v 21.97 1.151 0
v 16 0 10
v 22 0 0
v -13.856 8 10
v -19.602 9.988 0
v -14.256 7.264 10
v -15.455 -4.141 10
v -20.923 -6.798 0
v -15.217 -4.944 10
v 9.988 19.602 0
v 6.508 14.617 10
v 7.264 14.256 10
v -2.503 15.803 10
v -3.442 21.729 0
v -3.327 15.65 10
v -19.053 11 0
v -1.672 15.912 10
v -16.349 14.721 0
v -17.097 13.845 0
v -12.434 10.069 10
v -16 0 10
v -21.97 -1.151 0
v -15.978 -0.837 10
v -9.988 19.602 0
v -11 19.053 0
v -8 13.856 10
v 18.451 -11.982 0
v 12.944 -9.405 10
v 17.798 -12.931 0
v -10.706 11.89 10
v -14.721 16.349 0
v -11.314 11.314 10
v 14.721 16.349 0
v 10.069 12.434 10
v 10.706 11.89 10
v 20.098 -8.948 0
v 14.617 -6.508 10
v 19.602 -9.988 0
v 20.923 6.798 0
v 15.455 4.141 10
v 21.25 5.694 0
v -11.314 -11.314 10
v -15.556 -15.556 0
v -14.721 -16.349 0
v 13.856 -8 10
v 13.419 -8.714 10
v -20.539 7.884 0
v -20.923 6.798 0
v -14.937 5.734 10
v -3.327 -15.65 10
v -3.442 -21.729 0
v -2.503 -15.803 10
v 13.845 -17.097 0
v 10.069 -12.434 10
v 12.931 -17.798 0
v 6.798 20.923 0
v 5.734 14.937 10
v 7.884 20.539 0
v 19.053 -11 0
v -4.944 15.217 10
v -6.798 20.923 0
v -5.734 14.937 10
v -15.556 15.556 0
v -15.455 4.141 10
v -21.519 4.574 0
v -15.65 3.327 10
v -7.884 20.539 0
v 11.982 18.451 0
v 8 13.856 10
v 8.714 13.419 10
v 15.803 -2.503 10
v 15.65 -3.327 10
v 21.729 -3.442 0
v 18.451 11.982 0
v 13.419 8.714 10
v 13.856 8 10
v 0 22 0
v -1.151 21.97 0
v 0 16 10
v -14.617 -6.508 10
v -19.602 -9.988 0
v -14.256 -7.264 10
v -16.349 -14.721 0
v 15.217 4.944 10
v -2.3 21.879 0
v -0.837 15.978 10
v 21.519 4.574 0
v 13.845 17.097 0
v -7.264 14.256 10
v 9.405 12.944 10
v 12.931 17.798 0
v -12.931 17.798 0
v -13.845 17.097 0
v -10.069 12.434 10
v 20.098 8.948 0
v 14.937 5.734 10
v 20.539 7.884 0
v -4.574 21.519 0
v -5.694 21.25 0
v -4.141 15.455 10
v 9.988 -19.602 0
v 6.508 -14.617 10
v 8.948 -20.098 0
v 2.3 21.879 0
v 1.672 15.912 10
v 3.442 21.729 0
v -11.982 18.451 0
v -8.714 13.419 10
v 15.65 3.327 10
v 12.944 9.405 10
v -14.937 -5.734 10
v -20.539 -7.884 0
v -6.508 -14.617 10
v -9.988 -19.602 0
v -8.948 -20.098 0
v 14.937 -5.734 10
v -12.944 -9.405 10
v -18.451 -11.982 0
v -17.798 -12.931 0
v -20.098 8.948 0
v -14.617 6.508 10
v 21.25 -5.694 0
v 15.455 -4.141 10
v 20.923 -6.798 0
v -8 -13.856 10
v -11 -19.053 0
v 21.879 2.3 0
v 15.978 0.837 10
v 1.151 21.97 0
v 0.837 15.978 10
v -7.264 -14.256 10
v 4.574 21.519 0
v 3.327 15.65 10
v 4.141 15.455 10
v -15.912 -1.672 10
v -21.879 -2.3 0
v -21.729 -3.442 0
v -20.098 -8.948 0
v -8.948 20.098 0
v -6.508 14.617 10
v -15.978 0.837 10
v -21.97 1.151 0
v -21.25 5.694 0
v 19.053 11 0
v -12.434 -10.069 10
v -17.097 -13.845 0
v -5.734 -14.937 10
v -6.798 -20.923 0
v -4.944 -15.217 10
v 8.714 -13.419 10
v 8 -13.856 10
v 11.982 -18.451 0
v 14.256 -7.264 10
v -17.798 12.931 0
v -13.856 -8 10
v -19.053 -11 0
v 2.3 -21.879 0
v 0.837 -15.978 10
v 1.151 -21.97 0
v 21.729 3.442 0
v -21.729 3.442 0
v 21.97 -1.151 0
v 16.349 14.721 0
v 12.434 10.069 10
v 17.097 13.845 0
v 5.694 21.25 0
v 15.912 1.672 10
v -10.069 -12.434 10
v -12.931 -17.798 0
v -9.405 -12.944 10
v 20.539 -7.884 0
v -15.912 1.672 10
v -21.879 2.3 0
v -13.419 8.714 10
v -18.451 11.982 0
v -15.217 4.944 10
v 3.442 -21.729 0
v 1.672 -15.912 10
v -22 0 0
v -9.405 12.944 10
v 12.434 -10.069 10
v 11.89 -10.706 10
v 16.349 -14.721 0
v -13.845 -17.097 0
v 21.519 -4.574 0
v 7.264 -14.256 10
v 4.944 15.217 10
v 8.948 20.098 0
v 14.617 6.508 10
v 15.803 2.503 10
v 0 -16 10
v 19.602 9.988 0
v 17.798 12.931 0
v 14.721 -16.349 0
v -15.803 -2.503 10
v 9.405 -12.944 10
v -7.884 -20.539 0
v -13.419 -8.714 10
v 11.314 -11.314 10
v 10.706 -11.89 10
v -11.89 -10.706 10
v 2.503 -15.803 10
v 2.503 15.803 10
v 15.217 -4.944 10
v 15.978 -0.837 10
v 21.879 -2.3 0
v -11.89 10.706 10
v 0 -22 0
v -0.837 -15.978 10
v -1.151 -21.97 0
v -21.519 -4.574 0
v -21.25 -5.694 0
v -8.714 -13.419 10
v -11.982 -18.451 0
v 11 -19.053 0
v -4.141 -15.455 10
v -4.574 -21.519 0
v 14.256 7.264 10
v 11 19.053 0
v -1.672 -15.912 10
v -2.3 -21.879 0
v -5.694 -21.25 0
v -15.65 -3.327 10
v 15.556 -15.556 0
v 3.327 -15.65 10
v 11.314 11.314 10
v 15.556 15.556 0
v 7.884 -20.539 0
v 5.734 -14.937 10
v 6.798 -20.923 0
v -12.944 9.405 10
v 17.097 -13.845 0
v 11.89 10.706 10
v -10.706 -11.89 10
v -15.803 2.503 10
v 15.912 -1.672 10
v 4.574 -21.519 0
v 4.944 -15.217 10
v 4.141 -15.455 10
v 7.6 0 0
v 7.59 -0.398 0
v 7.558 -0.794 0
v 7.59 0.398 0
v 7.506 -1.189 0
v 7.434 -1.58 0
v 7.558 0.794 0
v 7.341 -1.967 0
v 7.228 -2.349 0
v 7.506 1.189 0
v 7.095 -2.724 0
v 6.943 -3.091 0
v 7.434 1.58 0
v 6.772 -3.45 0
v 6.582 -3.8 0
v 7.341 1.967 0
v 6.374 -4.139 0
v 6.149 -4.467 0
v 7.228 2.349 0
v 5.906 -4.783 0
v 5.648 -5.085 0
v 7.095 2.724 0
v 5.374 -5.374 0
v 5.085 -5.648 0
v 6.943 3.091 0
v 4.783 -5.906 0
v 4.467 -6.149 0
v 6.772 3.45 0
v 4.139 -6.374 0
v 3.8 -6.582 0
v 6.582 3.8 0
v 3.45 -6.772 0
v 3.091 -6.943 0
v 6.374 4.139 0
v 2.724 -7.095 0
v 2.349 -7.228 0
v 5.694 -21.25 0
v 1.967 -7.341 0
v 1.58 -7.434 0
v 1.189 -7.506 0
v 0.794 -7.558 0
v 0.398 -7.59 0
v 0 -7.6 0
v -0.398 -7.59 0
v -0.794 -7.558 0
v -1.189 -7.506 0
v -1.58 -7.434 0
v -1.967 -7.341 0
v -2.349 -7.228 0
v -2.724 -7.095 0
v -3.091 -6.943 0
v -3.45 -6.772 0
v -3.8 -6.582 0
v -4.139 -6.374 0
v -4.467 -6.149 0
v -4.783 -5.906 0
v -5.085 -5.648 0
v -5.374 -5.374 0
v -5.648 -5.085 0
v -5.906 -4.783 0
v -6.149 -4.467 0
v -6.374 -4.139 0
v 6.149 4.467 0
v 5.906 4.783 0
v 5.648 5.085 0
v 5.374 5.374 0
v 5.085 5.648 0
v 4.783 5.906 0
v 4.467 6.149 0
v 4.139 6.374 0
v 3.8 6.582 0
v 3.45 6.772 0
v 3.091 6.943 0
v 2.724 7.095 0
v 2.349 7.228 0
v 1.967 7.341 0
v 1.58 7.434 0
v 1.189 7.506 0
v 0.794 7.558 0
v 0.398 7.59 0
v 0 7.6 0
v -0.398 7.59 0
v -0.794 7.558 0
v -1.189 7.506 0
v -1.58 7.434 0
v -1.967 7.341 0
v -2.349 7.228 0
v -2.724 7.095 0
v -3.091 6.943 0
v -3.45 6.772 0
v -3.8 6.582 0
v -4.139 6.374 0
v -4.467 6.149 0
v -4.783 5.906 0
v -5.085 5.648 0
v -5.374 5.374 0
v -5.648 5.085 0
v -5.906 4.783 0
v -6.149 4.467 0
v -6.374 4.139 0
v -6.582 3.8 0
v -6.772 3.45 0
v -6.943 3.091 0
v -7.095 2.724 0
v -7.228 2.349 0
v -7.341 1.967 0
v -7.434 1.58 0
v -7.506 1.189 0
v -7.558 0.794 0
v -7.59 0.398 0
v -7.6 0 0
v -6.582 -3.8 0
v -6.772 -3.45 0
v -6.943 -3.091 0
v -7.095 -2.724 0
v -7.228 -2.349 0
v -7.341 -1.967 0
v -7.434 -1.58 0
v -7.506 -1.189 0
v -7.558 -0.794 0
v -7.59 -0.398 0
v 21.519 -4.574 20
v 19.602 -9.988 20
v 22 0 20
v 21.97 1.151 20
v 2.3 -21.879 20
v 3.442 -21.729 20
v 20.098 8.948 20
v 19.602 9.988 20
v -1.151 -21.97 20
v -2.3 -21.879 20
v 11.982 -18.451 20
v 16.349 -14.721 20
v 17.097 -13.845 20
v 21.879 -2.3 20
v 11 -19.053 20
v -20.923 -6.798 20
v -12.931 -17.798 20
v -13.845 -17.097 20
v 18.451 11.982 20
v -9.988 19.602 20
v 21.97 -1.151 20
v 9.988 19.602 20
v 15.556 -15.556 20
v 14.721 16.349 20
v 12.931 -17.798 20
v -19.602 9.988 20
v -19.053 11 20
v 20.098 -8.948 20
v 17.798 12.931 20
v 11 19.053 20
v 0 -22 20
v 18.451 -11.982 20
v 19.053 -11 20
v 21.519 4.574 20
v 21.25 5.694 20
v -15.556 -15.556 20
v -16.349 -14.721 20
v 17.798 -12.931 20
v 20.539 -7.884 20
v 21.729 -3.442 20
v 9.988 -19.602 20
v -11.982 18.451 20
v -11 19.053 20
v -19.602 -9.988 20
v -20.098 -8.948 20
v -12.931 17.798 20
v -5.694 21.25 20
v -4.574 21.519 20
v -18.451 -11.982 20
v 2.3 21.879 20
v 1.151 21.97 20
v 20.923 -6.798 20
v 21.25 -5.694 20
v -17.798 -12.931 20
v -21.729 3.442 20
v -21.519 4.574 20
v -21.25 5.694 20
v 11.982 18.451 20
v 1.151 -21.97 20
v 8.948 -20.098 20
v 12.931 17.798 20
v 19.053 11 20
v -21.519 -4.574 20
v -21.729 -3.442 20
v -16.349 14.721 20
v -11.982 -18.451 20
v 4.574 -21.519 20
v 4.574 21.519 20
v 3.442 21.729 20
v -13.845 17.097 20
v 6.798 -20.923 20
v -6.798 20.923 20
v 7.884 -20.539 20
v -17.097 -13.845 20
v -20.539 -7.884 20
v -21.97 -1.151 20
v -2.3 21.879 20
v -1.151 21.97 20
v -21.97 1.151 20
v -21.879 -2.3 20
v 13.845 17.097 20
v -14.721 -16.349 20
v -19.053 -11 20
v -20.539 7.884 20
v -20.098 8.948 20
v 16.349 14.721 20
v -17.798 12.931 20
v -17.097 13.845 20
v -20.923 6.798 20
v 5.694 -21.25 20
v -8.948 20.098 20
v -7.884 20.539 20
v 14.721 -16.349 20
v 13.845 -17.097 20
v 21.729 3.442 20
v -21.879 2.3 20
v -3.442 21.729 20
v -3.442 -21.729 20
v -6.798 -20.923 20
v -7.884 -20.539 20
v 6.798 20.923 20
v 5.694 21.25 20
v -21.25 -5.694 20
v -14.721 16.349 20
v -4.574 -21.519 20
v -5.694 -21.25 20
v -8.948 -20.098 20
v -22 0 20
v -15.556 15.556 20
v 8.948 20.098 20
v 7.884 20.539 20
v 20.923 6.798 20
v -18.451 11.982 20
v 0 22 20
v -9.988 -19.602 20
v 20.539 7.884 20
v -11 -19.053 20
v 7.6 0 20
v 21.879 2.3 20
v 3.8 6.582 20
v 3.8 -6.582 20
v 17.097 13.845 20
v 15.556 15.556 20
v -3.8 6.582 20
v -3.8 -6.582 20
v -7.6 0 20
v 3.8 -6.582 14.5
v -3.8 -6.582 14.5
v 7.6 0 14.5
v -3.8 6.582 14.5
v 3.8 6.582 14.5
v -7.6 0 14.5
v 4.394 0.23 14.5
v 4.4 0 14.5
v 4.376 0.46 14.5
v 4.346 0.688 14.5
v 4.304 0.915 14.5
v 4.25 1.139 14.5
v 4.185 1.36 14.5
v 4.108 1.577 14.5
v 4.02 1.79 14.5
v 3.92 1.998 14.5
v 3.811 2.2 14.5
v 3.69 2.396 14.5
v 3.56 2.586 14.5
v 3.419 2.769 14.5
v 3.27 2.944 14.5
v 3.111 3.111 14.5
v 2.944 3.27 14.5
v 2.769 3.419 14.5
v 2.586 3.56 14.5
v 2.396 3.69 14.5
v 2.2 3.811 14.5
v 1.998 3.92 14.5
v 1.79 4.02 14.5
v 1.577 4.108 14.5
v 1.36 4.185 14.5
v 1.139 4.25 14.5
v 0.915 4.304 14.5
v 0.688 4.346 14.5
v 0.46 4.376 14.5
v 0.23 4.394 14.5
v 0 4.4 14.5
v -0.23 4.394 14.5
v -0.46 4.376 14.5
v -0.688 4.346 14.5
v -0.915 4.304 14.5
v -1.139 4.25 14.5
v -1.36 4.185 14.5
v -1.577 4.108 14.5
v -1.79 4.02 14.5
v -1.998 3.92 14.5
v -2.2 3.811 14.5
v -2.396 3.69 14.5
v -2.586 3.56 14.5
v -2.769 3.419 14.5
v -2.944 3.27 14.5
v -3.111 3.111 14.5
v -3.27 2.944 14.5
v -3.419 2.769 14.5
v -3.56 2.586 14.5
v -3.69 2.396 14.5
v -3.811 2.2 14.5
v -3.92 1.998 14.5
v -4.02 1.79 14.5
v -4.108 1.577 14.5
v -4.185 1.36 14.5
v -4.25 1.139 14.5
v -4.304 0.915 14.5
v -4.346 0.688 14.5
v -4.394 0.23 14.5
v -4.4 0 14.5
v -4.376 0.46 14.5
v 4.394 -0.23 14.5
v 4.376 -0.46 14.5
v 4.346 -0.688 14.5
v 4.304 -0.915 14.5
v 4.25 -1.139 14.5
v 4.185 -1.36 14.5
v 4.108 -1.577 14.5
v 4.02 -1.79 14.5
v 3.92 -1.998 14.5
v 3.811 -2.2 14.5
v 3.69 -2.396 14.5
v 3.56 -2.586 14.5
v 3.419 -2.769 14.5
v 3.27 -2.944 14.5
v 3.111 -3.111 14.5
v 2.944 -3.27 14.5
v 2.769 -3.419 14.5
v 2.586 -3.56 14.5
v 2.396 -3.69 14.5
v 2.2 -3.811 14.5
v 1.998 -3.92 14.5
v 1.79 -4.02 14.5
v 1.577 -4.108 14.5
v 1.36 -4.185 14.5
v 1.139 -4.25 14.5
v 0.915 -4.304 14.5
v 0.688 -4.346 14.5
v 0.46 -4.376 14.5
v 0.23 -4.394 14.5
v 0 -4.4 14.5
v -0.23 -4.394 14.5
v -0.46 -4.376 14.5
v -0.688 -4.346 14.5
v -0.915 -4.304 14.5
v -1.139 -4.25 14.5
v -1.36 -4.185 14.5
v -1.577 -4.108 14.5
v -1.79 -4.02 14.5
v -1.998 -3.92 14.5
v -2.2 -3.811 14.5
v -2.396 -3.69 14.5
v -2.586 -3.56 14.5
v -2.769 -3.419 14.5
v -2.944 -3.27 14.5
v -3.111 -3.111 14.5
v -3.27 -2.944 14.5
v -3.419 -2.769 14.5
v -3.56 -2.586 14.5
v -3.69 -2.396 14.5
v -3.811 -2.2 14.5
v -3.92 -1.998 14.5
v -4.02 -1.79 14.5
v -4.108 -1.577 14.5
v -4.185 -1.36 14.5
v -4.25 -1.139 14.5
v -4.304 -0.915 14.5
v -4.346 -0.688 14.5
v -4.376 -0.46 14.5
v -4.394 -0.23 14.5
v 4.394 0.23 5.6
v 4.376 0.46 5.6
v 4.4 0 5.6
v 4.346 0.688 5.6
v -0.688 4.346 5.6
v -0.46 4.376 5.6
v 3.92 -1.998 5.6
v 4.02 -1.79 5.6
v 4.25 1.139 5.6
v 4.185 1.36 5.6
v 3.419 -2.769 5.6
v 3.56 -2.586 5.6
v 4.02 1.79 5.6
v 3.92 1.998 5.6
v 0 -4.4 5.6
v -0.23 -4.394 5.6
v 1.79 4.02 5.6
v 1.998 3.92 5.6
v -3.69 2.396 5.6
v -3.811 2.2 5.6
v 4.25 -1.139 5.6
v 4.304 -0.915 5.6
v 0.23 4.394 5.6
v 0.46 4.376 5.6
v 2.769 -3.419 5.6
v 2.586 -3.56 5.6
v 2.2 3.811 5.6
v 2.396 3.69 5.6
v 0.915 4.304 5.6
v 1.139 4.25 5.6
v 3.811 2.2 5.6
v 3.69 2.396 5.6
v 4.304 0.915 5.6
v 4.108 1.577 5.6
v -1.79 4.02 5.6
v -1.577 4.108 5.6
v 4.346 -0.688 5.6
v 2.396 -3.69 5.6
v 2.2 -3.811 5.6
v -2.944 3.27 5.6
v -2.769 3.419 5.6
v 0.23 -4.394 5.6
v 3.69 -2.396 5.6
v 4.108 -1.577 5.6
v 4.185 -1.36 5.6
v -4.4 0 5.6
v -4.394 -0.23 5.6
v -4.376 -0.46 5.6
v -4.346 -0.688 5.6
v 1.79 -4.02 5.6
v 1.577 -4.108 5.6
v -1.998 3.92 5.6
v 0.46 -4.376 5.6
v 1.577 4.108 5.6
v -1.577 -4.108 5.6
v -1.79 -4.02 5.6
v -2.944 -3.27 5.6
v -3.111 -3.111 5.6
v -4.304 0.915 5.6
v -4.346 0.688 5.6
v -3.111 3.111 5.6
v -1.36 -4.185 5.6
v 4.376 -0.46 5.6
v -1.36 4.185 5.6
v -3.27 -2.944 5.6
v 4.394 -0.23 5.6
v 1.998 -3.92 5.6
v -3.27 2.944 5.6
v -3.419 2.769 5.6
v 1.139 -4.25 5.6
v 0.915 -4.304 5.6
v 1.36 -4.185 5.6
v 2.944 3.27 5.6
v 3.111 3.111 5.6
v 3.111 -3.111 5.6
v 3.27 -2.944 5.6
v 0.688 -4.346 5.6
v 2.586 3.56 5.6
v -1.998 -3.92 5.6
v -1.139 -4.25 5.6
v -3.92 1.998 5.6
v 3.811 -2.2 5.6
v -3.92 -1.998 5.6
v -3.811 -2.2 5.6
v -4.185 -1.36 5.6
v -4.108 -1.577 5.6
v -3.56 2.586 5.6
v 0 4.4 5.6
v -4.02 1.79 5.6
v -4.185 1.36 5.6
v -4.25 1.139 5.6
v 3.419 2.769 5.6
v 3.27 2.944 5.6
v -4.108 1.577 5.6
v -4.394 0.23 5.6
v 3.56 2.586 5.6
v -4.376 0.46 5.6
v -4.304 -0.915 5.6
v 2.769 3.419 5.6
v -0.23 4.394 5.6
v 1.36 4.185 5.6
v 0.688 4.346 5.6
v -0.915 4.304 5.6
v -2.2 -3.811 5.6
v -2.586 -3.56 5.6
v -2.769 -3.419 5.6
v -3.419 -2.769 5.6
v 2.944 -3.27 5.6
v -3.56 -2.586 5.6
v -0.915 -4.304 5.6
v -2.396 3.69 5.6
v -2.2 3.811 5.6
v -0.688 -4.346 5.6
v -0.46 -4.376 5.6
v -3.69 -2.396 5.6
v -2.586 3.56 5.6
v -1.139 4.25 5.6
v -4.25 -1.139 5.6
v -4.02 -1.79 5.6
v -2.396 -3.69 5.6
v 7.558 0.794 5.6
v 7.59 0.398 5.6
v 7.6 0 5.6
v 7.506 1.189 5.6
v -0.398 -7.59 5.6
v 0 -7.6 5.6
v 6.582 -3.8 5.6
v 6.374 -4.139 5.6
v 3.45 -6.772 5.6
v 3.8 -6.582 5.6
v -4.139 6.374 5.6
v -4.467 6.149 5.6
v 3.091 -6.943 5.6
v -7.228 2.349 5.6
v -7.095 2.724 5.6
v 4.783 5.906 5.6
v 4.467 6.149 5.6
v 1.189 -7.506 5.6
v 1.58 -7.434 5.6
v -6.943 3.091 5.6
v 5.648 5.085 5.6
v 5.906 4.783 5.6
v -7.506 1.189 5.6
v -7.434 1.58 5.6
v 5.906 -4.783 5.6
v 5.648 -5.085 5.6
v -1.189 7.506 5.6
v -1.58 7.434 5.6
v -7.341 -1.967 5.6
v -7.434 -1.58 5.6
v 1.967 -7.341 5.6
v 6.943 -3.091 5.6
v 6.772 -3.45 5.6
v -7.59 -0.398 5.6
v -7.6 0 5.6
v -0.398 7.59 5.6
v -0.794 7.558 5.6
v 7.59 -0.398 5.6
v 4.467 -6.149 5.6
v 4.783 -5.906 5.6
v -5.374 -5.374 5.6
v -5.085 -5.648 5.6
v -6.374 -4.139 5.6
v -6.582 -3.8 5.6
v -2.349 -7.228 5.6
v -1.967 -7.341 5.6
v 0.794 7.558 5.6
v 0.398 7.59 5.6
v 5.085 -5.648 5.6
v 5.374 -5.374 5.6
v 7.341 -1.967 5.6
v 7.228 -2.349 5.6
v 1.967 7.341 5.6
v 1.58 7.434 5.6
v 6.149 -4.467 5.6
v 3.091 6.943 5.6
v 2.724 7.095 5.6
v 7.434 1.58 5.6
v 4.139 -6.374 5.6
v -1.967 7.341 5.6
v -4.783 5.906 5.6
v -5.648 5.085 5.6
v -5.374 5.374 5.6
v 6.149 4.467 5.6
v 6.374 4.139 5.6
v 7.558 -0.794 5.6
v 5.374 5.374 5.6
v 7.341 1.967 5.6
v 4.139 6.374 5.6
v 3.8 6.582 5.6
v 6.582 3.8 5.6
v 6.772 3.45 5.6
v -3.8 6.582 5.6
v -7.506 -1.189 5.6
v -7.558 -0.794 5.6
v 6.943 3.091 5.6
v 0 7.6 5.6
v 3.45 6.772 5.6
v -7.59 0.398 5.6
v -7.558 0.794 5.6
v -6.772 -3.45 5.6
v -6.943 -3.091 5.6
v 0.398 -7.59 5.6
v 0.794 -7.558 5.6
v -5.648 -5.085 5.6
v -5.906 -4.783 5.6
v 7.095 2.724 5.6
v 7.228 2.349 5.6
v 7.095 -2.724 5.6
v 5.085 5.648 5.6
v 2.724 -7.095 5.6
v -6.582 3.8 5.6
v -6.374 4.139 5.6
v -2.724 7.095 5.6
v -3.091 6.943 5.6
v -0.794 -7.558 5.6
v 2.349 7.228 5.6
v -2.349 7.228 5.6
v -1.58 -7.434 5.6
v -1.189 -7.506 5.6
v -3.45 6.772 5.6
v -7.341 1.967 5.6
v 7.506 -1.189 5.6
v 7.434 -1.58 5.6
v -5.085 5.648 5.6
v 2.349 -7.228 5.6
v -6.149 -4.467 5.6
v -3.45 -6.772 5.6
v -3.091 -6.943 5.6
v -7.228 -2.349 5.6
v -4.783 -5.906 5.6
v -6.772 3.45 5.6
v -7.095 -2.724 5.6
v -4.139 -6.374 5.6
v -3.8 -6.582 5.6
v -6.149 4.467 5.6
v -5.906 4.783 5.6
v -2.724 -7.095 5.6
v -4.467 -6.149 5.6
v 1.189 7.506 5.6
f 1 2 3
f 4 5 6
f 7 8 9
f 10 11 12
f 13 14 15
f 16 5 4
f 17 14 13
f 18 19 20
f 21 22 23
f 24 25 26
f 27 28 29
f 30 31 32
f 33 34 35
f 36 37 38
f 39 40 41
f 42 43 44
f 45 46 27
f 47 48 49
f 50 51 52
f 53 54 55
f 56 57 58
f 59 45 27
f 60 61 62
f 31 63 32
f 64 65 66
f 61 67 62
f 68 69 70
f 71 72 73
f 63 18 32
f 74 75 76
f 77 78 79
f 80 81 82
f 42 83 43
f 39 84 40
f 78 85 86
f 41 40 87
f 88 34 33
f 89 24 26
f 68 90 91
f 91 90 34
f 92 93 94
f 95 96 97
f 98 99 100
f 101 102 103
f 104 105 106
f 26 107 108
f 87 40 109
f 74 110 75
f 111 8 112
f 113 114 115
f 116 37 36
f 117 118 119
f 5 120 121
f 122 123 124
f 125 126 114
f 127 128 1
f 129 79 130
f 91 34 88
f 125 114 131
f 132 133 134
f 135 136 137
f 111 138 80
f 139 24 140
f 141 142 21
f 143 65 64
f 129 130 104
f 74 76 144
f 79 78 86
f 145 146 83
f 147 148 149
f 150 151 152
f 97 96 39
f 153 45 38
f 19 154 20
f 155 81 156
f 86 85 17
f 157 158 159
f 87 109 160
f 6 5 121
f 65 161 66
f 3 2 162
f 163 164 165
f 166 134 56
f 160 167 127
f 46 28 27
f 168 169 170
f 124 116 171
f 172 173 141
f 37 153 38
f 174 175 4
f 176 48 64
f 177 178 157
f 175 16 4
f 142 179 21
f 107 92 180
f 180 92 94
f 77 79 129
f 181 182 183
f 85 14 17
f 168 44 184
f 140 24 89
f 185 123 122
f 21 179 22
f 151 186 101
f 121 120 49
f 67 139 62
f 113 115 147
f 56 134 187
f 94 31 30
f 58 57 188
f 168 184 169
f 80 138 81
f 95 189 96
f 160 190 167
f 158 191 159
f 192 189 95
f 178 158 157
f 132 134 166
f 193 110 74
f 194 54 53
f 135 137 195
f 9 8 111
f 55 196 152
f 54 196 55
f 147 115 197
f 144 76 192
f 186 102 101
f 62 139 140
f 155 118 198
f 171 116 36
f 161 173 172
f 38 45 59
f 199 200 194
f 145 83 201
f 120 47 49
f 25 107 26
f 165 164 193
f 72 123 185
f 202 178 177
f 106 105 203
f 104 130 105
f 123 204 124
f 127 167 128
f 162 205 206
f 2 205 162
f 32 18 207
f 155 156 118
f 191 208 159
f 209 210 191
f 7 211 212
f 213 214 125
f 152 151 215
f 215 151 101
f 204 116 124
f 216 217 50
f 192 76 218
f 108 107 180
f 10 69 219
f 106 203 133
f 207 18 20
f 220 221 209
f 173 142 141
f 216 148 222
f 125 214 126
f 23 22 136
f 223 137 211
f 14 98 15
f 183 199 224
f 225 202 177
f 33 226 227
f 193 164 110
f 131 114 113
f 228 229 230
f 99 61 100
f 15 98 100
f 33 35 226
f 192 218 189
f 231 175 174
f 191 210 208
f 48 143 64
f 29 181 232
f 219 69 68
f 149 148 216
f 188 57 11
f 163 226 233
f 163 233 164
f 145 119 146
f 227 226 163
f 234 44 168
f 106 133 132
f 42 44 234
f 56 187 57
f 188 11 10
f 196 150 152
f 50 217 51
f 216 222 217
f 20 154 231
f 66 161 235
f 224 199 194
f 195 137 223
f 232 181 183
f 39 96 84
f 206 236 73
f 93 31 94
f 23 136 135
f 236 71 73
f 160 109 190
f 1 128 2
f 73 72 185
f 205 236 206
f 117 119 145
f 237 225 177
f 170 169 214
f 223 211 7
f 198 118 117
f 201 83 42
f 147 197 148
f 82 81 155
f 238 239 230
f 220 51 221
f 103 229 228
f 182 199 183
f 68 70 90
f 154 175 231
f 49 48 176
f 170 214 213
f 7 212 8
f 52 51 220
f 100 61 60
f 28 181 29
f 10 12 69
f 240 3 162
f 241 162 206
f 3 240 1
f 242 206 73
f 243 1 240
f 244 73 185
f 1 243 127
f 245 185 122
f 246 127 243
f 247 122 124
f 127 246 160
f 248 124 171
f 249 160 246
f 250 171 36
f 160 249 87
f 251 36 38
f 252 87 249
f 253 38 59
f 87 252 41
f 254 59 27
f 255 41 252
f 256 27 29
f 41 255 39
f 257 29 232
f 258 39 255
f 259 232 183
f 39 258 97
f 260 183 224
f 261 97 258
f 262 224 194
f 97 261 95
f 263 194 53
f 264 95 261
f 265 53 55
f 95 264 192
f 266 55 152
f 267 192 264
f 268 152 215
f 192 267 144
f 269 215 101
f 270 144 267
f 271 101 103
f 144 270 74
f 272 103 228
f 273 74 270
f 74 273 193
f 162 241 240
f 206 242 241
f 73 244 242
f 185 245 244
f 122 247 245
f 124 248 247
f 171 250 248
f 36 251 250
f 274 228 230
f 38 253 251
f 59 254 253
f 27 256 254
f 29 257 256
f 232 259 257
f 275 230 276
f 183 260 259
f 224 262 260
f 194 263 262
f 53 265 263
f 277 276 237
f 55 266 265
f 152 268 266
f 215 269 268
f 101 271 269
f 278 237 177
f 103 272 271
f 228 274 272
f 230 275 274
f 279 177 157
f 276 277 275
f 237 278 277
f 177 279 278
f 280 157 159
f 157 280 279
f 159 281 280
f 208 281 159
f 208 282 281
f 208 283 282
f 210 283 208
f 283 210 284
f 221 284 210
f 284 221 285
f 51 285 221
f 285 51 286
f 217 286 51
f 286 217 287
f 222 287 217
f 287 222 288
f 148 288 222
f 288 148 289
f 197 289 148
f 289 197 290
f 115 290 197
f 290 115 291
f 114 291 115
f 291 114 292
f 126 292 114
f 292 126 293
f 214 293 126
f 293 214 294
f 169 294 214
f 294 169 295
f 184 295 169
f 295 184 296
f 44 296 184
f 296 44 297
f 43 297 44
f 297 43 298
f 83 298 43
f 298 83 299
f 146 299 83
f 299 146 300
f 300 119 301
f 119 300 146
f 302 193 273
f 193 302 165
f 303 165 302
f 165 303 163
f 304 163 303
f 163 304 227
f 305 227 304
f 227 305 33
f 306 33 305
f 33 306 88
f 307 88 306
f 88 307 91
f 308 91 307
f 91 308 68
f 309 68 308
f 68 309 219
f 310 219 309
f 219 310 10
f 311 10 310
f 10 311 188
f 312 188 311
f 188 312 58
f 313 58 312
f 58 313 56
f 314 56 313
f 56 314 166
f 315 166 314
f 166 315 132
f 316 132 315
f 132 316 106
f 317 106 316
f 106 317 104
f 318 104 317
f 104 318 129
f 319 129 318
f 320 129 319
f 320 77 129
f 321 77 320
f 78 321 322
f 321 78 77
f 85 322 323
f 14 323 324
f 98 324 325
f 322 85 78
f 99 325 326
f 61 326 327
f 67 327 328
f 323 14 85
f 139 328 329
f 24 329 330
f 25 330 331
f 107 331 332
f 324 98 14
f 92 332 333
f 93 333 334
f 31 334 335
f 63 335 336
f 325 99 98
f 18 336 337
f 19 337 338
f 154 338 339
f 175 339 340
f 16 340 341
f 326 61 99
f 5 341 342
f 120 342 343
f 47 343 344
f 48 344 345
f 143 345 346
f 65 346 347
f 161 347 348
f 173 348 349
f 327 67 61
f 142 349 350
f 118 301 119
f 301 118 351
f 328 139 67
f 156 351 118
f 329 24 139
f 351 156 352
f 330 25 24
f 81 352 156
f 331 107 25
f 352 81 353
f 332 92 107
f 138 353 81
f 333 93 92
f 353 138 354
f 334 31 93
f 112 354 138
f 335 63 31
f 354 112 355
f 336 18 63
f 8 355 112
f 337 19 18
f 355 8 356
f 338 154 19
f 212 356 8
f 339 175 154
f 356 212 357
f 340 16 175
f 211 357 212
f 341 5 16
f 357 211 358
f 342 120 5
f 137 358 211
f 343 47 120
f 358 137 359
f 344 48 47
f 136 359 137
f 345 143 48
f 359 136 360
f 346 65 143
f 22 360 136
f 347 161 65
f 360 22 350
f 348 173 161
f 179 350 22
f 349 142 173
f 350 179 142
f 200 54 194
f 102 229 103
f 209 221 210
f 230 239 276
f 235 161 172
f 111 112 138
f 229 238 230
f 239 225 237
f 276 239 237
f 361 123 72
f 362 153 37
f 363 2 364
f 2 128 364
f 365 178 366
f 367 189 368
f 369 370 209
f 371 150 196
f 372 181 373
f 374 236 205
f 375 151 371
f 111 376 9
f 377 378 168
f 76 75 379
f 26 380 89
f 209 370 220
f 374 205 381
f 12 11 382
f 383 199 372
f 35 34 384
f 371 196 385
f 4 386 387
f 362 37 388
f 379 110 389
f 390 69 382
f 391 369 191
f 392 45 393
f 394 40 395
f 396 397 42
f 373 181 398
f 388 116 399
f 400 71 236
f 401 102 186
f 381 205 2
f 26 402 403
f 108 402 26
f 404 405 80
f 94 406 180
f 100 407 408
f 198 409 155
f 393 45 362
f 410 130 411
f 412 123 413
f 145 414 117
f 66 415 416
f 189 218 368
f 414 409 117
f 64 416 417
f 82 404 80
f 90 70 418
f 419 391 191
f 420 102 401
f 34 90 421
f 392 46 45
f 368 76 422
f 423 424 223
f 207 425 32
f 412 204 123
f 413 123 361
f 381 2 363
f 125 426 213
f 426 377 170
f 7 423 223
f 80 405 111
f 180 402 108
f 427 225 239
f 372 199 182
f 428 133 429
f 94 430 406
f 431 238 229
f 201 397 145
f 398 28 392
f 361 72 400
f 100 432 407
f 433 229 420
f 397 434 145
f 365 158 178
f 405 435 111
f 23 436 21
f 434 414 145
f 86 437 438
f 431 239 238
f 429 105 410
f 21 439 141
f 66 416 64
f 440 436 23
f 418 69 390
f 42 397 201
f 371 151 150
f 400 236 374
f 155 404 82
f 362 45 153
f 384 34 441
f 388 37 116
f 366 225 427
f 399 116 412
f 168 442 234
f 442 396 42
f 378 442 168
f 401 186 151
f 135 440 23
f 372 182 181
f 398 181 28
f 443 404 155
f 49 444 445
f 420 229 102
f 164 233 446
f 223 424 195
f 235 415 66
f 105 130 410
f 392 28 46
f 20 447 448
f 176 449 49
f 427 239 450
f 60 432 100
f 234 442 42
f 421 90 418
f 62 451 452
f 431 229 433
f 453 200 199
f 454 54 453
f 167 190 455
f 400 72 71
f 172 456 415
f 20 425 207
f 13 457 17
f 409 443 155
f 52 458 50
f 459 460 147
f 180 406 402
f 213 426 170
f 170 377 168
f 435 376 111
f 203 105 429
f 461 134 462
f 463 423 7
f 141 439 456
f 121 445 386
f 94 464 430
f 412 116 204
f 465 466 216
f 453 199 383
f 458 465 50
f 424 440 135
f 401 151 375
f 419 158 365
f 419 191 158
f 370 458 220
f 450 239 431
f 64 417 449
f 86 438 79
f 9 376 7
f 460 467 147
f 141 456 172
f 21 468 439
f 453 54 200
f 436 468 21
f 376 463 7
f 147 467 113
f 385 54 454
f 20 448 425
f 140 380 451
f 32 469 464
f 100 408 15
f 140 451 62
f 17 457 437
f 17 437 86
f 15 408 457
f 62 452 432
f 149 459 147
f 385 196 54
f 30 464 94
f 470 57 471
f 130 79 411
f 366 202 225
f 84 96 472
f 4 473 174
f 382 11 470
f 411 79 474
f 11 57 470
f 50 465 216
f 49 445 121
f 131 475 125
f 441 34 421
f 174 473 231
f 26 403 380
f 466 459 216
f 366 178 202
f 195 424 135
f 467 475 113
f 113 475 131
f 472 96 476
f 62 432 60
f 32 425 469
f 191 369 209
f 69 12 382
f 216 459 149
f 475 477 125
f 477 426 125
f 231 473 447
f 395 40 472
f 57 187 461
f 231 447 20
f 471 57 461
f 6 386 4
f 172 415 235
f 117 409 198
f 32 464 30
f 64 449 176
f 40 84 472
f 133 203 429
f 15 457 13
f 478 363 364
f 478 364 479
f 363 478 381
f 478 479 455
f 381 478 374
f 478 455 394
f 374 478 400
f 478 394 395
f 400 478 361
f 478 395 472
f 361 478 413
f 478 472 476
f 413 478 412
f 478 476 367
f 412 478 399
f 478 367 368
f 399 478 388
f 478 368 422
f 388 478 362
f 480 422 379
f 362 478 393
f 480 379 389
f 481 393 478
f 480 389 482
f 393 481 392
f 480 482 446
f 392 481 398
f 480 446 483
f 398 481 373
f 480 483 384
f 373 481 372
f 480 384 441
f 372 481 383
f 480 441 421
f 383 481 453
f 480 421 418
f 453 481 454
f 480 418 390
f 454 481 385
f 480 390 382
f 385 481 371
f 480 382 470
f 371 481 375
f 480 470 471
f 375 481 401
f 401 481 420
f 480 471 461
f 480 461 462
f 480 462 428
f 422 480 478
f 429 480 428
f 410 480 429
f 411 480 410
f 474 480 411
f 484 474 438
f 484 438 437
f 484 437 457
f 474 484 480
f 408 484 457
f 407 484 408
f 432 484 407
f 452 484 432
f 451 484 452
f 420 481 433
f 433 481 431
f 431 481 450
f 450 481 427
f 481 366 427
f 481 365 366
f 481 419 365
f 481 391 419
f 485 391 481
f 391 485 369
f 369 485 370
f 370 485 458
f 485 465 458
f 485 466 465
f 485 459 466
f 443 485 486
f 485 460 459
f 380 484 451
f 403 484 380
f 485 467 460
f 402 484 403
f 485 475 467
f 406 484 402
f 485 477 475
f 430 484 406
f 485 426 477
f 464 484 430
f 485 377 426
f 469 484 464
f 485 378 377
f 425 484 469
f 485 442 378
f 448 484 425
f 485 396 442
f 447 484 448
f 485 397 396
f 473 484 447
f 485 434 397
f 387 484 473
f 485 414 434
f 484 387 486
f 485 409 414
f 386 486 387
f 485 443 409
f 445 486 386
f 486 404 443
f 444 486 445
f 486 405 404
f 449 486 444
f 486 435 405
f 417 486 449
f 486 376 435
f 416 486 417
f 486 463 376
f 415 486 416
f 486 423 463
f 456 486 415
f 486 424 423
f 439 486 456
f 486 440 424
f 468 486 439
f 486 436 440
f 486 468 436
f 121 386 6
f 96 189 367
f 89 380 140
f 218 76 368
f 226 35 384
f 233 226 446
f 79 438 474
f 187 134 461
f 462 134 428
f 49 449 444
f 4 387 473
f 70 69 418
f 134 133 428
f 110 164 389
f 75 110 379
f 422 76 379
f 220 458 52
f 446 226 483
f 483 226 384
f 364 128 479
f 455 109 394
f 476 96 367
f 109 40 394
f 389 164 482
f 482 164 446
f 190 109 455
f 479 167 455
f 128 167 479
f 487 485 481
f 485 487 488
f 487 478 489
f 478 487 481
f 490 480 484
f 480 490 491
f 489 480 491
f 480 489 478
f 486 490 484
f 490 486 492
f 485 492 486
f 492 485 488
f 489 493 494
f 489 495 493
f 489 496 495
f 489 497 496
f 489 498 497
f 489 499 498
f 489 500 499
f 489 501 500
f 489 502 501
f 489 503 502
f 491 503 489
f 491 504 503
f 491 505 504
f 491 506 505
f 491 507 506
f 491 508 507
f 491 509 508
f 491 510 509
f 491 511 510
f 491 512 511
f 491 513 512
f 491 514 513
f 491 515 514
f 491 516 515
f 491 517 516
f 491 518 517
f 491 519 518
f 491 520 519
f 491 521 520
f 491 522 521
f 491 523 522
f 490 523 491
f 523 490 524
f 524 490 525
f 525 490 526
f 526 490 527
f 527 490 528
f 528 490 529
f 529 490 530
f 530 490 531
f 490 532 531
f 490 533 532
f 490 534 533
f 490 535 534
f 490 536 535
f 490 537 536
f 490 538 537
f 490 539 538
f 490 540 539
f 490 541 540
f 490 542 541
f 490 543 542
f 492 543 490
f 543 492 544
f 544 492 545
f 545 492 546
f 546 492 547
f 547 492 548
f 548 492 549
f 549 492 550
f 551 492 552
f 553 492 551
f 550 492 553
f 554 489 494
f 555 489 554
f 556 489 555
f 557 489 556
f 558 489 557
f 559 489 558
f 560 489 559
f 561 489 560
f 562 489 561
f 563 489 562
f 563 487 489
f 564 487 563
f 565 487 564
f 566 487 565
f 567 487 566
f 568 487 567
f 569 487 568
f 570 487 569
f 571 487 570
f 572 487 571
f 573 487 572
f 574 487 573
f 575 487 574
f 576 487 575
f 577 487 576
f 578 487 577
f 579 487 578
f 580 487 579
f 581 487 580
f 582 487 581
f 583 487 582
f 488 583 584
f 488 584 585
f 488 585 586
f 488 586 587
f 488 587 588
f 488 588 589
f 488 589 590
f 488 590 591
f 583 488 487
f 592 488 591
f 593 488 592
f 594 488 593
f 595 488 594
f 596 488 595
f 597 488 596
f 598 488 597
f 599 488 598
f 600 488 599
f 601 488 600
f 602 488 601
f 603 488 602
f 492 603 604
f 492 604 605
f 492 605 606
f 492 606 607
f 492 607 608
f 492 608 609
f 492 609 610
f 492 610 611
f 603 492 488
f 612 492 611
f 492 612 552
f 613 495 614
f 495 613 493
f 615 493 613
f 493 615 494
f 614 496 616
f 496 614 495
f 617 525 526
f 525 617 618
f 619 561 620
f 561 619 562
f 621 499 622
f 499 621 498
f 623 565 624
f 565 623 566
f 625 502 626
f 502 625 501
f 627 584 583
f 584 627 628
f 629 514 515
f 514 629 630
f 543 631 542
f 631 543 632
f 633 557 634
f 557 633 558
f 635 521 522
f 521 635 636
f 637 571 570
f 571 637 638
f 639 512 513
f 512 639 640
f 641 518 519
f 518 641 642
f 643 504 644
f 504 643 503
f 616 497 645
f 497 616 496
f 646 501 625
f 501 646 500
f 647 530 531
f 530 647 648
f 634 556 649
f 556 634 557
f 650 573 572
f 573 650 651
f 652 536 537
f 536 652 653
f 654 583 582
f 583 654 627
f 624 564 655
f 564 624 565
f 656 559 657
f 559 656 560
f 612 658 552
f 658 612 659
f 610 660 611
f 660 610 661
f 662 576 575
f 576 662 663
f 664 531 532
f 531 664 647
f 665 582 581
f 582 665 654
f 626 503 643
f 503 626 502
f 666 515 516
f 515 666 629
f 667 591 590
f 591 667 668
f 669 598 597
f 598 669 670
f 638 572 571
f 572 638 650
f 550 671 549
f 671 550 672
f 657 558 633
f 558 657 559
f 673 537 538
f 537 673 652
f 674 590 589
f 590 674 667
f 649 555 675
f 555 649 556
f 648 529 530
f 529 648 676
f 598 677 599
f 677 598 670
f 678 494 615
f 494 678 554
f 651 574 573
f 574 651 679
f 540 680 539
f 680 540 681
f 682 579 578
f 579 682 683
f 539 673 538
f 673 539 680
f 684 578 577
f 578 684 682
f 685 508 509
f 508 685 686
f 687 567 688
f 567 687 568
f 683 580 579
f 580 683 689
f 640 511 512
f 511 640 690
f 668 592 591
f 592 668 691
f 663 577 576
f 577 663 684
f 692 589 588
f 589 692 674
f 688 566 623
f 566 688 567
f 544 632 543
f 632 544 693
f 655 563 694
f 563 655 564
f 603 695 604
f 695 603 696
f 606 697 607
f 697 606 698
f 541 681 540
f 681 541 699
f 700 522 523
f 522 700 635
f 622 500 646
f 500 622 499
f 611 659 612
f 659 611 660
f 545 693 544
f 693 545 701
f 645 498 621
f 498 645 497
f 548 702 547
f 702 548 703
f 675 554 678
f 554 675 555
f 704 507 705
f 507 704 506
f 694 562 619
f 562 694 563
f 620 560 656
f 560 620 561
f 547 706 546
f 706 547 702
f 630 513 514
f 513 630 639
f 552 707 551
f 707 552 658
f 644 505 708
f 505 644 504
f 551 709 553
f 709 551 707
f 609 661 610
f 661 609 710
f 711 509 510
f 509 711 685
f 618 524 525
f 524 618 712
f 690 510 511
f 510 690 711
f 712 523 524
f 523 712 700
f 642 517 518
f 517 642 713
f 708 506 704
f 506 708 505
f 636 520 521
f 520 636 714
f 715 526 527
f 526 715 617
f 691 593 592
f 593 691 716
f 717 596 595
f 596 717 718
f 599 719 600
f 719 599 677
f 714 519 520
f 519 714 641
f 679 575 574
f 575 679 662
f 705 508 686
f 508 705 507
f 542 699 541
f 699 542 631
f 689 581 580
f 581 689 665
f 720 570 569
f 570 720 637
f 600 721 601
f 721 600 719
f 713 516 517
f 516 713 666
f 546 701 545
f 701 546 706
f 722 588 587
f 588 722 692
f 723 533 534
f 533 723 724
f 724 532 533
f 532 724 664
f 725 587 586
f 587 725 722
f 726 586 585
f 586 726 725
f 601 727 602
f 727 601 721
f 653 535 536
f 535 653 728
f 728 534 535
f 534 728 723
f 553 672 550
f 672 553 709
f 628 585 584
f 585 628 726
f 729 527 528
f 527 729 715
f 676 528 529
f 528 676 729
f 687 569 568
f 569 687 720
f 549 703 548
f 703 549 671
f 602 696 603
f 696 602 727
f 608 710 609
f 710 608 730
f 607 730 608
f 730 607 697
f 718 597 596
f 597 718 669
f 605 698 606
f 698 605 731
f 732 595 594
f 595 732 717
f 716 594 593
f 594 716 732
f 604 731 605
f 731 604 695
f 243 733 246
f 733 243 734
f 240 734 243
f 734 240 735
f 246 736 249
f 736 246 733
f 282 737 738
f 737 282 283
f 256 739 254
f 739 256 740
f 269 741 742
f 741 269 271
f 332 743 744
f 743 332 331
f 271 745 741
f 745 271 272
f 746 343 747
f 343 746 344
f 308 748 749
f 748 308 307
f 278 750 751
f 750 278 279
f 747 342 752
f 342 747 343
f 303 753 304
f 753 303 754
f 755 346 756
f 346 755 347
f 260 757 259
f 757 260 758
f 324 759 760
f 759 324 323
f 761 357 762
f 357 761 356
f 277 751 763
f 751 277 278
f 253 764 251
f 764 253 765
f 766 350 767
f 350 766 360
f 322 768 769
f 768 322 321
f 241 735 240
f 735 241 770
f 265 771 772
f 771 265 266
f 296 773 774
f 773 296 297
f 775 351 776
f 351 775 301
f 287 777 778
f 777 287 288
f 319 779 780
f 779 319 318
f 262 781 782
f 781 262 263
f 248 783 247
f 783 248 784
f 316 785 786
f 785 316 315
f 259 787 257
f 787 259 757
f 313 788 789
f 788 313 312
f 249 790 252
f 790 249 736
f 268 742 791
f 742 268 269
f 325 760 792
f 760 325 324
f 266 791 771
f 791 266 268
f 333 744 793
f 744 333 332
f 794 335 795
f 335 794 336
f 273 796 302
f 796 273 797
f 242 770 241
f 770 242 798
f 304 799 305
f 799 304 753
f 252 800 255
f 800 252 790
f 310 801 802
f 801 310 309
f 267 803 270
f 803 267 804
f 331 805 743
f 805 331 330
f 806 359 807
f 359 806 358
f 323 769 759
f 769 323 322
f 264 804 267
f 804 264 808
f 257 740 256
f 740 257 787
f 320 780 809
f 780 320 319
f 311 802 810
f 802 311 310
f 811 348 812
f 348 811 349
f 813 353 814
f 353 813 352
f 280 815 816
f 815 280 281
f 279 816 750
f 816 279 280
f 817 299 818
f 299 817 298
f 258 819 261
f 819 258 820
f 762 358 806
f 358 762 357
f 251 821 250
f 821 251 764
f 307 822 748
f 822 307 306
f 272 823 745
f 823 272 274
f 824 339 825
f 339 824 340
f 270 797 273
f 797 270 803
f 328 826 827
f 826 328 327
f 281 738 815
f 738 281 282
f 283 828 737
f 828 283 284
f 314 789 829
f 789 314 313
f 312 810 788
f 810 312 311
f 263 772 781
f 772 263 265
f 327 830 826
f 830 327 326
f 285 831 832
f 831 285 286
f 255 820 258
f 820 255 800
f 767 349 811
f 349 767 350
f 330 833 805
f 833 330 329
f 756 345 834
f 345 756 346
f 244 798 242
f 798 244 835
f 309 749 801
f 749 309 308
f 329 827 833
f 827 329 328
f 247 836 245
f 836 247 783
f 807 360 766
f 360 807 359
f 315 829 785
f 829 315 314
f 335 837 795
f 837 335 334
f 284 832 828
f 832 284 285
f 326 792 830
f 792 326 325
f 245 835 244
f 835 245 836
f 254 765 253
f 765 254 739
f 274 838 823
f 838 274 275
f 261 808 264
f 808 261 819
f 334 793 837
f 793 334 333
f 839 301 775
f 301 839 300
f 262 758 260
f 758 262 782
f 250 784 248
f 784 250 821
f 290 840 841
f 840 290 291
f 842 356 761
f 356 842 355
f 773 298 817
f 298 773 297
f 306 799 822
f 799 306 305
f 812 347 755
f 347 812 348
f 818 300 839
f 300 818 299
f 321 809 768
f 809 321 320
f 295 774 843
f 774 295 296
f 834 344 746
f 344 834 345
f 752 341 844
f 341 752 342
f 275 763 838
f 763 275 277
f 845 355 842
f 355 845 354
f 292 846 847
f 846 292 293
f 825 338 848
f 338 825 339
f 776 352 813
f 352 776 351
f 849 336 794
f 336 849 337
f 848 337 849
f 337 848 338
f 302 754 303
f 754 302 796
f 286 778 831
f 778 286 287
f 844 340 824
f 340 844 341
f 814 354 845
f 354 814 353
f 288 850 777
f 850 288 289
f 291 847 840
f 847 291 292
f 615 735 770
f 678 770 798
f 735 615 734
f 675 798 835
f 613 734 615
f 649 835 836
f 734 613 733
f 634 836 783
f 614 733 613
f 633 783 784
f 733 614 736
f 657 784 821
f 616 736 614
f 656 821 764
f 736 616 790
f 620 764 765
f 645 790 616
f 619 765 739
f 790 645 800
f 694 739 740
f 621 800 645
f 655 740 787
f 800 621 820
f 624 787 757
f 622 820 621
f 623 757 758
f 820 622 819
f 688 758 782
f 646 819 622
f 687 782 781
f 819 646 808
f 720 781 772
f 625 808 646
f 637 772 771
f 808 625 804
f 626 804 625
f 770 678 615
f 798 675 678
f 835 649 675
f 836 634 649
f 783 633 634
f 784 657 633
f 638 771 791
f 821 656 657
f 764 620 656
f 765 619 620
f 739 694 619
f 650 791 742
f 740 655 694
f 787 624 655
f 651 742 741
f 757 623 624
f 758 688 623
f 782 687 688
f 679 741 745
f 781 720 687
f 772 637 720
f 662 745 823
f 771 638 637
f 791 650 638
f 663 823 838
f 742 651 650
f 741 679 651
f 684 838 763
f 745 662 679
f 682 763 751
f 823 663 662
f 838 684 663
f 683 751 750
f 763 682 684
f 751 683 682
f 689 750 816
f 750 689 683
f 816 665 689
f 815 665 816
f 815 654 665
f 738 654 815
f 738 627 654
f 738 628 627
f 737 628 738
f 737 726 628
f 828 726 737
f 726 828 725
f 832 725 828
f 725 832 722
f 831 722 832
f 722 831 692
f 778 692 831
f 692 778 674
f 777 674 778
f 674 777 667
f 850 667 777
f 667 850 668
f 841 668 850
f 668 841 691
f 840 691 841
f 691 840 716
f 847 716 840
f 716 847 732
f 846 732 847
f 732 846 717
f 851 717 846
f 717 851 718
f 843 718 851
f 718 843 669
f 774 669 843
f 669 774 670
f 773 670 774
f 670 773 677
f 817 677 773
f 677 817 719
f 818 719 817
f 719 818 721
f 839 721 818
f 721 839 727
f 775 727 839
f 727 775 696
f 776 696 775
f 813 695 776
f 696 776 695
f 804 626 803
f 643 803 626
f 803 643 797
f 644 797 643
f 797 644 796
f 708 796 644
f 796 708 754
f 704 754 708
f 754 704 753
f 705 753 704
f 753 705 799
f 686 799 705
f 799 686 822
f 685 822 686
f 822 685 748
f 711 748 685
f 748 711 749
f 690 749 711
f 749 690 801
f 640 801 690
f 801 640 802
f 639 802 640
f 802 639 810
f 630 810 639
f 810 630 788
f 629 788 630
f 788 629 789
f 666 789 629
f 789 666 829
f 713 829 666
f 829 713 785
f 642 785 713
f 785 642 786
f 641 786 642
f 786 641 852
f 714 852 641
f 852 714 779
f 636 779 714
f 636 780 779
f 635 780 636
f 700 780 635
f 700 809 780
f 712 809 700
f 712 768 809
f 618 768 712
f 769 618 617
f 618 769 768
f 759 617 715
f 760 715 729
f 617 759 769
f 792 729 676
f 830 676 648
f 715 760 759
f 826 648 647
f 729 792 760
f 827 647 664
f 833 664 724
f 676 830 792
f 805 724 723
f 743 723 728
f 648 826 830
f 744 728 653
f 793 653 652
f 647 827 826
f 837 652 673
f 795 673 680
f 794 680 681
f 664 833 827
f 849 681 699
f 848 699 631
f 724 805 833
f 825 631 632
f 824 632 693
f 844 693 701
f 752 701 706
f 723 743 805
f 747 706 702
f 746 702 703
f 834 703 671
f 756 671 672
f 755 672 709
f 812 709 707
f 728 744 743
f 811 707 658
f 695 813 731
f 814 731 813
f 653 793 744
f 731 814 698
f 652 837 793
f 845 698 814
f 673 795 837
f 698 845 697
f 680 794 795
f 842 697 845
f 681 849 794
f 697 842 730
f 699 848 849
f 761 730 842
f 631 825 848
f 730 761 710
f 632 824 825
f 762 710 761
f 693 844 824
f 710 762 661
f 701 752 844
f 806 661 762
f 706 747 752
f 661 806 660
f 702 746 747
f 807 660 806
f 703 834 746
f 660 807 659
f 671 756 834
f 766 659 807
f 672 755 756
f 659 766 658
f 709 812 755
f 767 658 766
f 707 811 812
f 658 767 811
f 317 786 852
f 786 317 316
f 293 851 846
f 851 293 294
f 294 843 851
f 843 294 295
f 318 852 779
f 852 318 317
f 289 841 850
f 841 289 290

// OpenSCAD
// also need a variant that takes the hex-head of a bolt instead of a bearing

radius_base            = 12;
radius_smallest        = 4;
radius_largest         = 10;
half_height            = 10;

bearing_height         = 5.6;
bearing_outer_diameter = 15.2;
bearing_hole_diameter  = 8.8;

include_top_bearing    = true;

epsilon                = 0.1;

$fn = 120;

difference() {
    union() {
        cylinder(h=half_height, r1=radius_base + radius_largest, r2=radius_base + radius_smallest);
        translate([0,0,half_height])
            cylinder(h=half_height, r1=radius_base + radius_smallest, r2=radius_base + radius_largest);
    }
    union() {
        // overriding $fn creates a polygon that is inscribed within the circle with
        // all sides (and angles) equal.
        translate([0,0,2*half_height-bearing_height+epsilon]) cylinder(h=bearing_height + epsilon, d=bearing_outer_diameter, $fn=6);
        translate([0,0,-epsilon]) cylinder(h=2*(half_height+epsilon), d=bearing_hole_diameter);
         if (include_top_bearing)
            translate([0,0,-epsilon]) cylinder(h=bearing_height + epsilon, d=bearing_outer_diameter);
   }
}
